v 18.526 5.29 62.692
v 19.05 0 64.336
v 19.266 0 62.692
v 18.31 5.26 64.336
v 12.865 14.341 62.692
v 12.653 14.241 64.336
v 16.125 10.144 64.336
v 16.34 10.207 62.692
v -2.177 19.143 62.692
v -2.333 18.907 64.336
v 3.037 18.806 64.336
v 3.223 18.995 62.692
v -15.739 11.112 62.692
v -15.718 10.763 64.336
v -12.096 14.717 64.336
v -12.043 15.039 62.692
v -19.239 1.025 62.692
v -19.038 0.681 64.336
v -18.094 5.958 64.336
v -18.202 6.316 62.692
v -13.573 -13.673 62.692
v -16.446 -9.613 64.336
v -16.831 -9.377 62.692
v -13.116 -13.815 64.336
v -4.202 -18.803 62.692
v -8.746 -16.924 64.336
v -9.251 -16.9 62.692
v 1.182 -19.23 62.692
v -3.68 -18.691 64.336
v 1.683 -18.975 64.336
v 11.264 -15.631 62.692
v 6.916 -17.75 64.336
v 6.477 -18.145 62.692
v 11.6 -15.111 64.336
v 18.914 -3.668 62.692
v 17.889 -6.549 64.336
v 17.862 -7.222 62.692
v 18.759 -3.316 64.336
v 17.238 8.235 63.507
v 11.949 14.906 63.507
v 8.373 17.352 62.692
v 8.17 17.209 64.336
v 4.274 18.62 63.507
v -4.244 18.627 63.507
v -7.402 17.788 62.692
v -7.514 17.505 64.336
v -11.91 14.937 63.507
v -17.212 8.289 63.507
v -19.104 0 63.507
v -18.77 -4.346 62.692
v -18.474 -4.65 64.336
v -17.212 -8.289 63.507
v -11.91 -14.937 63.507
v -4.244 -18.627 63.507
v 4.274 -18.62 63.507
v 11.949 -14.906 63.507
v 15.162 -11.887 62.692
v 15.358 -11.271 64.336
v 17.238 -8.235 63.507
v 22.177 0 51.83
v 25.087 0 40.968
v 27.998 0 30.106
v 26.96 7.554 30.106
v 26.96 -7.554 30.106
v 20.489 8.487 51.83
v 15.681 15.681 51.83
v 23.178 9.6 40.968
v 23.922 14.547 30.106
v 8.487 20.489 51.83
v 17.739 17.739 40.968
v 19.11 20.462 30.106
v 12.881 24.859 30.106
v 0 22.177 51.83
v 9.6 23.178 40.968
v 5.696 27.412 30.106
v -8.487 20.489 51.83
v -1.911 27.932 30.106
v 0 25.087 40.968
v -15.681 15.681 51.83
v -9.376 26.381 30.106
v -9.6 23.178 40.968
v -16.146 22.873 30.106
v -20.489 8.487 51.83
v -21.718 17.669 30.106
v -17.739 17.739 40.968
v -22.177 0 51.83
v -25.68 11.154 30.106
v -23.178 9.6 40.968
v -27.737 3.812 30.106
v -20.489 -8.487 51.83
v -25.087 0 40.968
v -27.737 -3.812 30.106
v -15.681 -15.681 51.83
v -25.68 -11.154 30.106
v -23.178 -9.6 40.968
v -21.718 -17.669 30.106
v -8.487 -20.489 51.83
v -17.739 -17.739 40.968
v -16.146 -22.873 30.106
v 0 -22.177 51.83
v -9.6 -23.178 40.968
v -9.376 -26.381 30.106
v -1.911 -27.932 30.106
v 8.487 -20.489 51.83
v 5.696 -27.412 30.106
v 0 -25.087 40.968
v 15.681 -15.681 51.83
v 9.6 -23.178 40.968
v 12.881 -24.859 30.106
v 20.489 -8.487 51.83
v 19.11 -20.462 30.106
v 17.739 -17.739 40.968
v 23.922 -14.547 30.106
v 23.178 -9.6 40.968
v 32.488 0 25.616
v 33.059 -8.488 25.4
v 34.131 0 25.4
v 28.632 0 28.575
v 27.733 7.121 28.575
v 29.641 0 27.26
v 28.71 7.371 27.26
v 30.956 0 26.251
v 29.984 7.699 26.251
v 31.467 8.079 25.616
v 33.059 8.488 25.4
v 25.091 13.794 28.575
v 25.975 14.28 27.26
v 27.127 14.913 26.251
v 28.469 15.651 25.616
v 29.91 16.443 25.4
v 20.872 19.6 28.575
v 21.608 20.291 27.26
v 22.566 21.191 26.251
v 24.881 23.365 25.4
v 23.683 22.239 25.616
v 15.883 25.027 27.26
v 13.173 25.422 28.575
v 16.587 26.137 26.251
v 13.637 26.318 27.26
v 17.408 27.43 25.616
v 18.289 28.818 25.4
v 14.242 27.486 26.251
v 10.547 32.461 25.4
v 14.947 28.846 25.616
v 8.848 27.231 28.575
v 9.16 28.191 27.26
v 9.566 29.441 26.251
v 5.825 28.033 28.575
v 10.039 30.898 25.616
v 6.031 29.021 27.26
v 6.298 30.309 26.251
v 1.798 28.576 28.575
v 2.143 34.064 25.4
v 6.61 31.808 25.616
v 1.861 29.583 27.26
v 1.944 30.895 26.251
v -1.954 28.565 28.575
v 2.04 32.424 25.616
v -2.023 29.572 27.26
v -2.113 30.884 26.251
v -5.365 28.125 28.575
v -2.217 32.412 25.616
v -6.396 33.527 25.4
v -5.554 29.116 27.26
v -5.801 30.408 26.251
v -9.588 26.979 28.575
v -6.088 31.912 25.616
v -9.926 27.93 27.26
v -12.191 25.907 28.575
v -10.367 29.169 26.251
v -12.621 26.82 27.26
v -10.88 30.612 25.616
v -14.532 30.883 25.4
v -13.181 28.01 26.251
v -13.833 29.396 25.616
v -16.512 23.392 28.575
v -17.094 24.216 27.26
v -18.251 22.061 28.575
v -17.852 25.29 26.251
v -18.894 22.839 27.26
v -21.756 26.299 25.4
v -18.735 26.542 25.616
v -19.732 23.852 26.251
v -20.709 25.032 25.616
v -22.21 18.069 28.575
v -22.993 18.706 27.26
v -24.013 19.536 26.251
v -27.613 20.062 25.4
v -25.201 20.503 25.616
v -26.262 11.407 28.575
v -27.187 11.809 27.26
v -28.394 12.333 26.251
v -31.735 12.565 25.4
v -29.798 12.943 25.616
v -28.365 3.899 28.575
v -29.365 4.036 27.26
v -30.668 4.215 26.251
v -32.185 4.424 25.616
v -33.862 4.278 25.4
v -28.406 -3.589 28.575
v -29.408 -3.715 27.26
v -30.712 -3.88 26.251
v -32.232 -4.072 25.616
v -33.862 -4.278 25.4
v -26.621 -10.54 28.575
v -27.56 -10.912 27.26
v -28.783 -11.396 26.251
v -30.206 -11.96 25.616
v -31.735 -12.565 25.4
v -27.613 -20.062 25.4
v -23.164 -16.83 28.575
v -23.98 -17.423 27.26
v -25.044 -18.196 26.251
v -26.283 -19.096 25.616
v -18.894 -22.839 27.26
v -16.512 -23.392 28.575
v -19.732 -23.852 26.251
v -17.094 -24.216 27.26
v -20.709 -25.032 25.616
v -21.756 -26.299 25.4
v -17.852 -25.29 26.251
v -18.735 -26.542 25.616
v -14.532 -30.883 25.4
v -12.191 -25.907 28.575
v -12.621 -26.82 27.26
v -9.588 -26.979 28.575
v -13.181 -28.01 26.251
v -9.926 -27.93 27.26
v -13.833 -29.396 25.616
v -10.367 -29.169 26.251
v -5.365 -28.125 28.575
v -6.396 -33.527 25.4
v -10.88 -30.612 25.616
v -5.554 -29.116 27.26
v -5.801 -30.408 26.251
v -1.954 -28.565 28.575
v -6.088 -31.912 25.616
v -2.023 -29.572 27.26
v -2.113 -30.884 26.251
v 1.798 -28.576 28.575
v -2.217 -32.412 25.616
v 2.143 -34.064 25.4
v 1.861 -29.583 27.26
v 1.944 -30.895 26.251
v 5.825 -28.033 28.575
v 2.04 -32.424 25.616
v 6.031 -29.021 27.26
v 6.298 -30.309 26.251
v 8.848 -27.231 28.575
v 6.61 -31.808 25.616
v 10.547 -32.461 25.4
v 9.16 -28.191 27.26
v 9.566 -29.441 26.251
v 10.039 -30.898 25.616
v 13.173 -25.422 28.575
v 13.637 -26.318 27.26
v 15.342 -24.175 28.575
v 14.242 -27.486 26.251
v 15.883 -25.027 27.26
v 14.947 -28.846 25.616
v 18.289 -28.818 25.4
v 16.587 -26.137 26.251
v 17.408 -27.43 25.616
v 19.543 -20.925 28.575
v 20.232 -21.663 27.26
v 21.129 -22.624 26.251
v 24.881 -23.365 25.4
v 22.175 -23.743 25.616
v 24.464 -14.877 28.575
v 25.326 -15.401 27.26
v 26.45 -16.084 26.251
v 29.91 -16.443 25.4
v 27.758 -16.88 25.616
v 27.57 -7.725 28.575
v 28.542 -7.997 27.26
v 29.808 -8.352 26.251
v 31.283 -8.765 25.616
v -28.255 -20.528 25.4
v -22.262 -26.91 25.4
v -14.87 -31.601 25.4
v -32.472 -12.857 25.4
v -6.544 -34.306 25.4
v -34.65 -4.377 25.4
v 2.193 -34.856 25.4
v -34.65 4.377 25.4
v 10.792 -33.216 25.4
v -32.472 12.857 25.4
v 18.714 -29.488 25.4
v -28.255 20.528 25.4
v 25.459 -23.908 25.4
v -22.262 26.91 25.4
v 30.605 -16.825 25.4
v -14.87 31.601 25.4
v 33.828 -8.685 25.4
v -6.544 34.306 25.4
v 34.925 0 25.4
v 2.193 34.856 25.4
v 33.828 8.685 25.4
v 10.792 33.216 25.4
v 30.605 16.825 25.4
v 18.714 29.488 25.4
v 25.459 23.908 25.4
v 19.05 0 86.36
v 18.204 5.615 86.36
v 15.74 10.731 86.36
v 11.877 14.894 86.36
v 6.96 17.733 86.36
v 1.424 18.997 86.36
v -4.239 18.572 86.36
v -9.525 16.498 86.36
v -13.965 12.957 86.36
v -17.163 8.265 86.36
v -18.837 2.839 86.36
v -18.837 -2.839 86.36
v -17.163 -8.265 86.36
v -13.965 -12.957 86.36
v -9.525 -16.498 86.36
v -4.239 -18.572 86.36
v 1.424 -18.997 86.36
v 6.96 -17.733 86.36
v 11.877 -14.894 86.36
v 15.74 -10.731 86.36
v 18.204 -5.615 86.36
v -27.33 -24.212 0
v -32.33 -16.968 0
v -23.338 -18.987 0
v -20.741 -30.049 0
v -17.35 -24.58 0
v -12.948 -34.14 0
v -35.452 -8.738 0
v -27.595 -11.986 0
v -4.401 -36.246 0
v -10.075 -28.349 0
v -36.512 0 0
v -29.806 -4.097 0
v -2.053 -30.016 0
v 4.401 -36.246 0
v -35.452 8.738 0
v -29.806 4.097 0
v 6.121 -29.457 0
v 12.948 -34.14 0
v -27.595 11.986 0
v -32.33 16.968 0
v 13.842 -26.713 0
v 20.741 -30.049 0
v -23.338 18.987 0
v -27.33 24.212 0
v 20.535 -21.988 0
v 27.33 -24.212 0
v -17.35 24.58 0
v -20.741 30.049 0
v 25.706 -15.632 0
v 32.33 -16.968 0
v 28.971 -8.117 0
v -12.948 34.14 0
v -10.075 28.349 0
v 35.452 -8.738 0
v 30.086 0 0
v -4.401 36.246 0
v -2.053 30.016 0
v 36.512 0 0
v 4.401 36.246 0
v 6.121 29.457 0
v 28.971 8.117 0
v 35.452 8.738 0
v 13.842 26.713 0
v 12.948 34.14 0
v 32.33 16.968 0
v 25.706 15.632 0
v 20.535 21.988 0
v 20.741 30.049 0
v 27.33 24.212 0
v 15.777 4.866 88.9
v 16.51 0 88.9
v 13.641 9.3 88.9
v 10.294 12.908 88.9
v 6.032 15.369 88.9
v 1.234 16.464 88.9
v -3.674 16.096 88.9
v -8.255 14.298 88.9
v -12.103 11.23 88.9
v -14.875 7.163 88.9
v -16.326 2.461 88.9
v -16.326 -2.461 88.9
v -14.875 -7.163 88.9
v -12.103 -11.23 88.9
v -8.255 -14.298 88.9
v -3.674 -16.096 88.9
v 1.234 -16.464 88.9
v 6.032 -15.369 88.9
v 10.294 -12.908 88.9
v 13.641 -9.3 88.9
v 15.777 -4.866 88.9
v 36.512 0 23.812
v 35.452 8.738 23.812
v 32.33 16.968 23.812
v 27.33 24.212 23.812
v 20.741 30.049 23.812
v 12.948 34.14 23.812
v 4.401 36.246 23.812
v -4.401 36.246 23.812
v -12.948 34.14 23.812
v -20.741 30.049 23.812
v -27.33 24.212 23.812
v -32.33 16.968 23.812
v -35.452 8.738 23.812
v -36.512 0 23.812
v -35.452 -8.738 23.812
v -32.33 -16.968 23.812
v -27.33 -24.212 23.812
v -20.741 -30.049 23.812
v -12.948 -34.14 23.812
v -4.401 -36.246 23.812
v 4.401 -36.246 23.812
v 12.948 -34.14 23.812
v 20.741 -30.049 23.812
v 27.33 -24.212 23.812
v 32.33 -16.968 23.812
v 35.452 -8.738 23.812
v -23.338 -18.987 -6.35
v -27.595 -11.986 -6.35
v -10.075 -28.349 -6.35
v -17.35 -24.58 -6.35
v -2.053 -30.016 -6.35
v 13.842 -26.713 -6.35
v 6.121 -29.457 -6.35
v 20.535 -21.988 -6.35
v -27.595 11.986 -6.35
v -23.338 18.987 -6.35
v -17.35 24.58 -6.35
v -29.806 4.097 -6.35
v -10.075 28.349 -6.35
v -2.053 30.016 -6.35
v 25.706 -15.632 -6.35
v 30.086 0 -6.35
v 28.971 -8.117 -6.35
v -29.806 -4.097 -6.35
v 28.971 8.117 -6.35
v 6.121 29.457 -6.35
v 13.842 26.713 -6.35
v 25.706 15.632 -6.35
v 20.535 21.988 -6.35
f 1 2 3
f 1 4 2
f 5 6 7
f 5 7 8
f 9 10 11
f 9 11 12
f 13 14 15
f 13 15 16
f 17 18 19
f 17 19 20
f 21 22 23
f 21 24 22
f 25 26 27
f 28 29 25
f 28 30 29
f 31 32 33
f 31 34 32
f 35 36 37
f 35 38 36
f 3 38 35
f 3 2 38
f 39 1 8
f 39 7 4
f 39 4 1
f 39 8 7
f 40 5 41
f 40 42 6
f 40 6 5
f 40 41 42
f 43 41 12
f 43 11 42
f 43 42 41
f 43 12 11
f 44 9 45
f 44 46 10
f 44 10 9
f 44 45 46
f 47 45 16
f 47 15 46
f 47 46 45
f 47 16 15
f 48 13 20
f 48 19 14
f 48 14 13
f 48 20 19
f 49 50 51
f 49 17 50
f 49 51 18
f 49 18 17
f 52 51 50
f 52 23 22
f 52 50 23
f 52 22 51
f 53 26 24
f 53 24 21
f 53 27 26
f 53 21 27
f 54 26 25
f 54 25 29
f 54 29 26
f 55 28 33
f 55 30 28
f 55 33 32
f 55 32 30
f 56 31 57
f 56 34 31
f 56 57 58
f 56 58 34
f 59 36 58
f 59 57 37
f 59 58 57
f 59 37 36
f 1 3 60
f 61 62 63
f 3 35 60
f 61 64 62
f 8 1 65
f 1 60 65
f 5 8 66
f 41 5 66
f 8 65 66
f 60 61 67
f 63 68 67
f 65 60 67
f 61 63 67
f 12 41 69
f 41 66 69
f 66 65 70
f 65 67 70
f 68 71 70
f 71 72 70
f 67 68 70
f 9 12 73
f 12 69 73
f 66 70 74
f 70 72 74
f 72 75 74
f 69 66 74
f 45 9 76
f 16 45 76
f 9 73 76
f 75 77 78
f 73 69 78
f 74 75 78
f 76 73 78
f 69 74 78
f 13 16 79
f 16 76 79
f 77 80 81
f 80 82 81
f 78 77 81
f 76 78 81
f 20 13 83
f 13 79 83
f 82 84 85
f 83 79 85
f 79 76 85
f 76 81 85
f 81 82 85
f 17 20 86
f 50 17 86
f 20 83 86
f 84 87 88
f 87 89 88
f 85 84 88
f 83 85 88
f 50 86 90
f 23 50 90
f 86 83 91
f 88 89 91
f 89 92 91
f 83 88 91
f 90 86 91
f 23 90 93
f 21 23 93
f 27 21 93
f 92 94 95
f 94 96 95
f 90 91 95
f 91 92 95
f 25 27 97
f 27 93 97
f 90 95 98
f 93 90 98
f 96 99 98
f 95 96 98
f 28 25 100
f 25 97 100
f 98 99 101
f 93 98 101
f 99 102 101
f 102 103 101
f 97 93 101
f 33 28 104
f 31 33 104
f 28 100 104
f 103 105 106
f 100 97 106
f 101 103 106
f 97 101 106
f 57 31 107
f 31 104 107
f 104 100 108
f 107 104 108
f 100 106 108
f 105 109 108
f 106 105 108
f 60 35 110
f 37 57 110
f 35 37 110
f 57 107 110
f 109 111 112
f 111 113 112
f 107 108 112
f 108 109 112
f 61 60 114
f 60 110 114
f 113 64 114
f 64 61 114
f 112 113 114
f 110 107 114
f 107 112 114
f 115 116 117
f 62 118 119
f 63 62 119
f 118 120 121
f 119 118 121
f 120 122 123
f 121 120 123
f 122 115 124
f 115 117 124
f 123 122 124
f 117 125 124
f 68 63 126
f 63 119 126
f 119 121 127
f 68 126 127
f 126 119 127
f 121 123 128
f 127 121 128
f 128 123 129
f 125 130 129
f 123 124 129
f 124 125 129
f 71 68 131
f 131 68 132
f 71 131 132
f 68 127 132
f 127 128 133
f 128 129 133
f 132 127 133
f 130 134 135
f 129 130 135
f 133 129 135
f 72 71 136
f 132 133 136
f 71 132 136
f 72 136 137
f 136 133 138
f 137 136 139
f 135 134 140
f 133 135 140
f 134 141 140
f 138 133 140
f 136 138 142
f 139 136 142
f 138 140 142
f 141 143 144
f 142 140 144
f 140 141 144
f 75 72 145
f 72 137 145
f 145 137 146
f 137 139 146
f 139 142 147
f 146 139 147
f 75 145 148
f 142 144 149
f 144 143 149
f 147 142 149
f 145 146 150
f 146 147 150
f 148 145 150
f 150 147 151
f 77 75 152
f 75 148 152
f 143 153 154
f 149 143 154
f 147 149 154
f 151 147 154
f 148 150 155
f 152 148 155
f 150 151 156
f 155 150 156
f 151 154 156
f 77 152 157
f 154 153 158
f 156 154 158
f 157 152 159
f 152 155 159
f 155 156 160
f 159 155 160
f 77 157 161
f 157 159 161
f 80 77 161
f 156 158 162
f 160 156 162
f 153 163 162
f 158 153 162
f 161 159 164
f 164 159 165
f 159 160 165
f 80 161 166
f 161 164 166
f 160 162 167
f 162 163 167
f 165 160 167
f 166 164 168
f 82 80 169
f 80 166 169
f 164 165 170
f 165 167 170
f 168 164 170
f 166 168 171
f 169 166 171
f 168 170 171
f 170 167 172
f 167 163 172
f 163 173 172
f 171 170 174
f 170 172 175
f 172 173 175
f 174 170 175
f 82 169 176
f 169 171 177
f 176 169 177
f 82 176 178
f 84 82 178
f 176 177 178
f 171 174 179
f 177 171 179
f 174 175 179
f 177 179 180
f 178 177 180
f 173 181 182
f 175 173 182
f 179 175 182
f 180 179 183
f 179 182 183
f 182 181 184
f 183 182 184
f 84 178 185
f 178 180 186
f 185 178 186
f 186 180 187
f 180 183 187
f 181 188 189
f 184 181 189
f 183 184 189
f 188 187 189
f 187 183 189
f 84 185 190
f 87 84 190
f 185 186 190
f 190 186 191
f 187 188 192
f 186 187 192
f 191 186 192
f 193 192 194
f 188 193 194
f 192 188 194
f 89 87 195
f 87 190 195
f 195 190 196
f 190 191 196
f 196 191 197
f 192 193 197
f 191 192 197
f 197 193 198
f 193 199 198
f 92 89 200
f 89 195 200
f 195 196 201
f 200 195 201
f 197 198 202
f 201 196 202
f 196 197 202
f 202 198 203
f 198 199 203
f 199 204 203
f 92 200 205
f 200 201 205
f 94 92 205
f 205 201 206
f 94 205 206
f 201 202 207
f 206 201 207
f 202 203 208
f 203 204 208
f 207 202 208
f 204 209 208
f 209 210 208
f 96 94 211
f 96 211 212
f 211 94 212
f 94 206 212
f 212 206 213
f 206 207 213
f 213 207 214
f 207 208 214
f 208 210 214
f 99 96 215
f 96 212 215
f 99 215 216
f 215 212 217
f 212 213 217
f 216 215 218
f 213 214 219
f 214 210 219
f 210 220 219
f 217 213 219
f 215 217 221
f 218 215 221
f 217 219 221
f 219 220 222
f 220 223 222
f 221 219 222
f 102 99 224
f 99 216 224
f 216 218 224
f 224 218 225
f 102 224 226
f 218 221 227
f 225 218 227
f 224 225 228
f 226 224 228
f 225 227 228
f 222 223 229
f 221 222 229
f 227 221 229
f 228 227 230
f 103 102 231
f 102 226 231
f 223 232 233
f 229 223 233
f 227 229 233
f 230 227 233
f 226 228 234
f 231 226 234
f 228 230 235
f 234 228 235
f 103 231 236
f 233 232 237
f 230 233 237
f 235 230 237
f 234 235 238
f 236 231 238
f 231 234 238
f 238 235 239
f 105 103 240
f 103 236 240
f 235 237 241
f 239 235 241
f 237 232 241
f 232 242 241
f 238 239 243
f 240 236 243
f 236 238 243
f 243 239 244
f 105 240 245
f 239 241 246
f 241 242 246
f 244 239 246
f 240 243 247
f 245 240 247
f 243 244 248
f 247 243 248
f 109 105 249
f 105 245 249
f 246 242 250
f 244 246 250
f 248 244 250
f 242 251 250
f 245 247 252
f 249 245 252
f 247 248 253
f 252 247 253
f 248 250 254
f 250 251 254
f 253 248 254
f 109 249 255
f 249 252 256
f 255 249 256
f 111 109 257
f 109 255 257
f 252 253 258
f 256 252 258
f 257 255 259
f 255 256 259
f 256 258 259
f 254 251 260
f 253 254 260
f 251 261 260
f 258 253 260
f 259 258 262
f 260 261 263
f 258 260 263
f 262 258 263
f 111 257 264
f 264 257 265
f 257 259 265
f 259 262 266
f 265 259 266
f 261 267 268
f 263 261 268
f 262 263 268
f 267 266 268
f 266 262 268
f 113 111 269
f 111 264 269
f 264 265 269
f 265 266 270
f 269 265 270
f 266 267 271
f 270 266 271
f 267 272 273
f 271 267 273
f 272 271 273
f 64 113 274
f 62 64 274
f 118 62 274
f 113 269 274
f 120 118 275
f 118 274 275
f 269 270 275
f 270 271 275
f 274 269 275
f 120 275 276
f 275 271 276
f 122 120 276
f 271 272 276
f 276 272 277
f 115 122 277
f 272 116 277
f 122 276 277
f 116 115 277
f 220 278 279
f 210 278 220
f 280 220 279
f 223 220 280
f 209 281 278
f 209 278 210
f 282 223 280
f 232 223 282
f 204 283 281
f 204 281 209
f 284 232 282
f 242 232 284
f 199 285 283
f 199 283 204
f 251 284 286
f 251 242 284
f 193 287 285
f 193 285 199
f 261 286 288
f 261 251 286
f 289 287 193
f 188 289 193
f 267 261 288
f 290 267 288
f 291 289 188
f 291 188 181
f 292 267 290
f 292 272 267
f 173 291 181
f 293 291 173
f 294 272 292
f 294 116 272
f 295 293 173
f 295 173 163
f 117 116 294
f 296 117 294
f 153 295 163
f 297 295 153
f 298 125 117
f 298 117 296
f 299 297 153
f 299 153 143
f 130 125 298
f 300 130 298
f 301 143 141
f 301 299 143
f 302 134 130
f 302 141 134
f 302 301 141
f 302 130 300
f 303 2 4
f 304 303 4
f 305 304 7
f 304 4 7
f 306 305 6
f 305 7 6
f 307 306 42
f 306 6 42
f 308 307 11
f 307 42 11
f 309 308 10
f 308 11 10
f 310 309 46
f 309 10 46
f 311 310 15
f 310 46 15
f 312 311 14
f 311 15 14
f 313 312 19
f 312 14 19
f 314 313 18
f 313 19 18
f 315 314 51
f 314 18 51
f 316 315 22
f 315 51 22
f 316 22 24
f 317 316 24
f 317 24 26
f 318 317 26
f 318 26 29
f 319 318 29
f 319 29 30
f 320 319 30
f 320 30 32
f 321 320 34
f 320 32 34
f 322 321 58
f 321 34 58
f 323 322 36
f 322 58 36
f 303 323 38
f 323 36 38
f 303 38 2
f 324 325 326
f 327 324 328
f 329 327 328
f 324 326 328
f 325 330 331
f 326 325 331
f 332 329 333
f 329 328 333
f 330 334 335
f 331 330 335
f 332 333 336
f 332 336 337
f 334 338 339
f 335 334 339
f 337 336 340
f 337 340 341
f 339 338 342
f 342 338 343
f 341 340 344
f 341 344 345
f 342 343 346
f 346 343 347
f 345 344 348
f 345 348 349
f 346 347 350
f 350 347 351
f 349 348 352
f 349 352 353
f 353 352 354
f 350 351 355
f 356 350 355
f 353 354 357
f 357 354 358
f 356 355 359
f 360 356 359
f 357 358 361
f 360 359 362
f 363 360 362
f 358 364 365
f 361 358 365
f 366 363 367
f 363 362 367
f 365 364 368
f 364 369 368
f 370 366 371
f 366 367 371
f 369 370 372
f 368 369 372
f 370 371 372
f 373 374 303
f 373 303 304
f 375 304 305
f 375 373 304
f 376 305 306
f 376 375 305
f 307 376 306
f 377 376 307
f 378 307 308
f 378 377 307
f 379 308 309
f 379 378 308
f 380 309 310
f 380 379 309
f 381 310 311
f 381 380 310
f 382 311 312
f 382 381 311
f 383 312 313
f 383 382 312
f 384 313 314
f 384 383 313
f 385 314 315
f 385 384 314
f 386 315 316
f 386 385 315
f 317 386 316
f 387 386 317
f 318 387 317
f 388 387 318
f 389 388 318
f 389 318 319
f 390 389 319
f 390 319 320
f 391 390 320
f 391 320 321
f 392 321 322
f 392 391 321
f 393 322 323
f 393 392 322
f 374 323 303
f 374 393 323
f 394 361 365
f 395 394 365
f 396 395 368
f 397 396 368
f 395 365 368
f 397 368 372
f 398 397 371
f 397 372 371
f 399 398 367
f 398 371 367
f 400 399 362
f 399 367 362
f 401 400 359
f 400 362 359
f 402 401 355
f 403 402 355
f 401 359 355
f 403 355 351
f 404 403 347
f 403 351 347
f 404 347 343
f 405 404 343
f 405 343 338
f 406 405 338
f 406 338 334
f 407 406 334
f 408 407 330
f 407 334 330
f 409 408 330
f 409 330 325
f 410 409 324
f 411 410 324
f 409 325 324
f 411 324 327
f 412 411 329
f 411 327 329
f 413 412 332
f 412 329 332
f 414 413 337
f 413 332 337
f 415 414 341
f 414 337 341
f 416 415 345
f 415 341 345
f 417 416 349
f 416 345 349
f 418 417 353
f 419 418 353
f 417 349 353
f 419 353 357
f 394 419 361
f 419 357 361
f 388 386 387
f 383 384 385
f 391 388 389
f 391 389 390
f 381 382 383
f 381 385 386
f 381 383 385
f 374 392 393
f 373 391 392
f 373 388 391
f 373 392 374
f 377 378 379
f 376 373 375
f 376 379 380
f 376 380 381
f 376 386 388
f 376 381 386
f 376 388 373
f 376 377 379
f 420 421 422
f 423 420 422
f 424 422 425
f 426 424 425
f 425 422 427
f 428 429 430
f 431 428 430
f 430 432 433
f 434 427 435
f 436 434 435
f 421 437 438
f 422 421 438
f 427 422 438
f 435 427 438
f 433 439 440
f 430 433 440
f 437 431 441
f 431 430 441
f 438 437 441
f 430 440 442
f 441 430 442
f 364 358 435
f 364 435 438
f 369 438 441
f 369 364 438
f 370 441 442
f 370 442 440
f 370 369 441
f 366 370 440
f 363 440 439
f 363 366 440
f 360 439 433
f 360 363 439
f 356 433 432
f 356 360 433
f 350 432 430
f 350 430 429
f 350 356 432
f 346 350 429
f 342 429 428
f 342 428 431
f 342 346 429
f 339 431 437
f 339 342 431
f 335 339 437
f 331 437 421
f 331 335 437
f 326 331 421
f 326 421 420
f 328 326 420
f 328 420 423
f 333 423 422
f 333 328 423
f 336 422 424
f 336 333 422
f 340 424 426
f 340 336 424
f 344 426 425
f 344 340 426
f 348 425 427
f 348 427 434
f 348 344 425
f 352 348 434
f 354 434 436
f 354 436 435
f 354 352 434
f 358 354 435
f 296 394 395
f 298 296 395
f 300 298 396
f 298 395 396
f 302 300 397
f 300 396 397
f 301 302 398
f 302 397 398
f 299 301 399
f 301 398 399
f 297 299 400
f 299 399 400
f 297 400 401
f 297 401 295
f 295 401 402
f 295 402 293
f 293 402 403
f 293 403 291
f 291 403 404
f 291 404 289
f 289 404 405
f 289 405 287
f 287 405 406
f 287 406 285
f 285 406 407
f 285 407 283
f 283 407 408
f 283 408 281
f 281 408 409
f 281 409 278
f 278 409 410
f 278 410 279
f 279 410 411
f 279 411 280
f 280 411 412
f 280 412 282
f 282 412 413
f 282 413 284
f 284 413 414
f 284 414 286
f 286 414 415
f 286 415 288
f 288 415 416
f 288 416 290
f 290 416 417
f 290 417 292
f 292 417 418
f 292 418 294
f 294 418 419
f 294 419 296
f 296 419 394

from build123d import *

# Parameters (mm, degrees)
SKETCH1_R           = 30.0863
BOSS_EXTRUDE1_DEPTH = 6.35
SKETCH2_R           = 36.5125
BOSS_EXTRUDE2_DEPTH = 25.4
SKETCH3_R           = 19.05
BOSS_EXTRUDE3_DEPTH = 38.1
DRAFT1_ANGLE        = 15
SKETCH4_R           = 19.05
BOSS_EXTRUDE4_DEPTH = 25.4
CHAMFER1_SIZE       = 2.54
FILLET1_R           = 6.35
CHAMFER2_SIZE       = 1.5875


with BuildPart() as part:
    # Sketch1 → Boss-Extrude1 (new body)
    with BuildSketch(Plane.XY):
        Circle(SKETCH1_R)
    extrude(amount=-BOSS_EXTRUDE1_DEPTH)

    # Sketch2 → Boss-Extrude2 (add)
    with BuildSketch(Plane.XY):
        Circle(SKETCH2_R)
    extrude(amount=BOSS_EXTRUDE2_DEPTH)

    # Sketch3 → Boss-Extrude3 (add)
    with BuildSketch(Plane.XY.offset(25.4)):
        Circle(SKETCH3_R)
    extrude(amount=BOSS_EXTRUDE3_DEPTH)

    # Draft1
    draft1_faces = [part.faces().sort_by_distance(p)[0] for p in [
        (-19.05, 0, 44.45),
    ]]
    draft(draft1_faces, Plane.XY.offset(63.5), DRAFT1_ANGLE)

    # Sketch4 → Boss-Extrude4 (add)
    with BuildSketch(Plane.XY.offset(63.5)):
        Circle(SKETCH4_R)
    extrude(amount=BOSS_EXTRUDE4_DEPTH)

    # Chamfer1
    chamfer1_edges = [part.edges().sort_by_distance(p)[0] for p in [
        (-19.05, 0, 88.9),
    ]]
    chamfer(chamfer1_edges, length=CHAMFER1_SIZE)

    # Fillet1
    fillet1_edges = [part.edges().sort_by_distance(p)[0] for p in [
        (-19.05, 0, 63.5),
        (-29.258864232, 0, 25.4),
    ]]
    fillet(fillet1_edges, radius=FILLET1_R)

    # Chamfer2
    chamfer2_edges = [part.edges().sort_by_distance(p)[0] for p in [
        (-36.5125, 0, 25.4),
    ]]
    chamfer(chamfer2_edges, length=CHAMFER2_SIZE)


solid = part.part
